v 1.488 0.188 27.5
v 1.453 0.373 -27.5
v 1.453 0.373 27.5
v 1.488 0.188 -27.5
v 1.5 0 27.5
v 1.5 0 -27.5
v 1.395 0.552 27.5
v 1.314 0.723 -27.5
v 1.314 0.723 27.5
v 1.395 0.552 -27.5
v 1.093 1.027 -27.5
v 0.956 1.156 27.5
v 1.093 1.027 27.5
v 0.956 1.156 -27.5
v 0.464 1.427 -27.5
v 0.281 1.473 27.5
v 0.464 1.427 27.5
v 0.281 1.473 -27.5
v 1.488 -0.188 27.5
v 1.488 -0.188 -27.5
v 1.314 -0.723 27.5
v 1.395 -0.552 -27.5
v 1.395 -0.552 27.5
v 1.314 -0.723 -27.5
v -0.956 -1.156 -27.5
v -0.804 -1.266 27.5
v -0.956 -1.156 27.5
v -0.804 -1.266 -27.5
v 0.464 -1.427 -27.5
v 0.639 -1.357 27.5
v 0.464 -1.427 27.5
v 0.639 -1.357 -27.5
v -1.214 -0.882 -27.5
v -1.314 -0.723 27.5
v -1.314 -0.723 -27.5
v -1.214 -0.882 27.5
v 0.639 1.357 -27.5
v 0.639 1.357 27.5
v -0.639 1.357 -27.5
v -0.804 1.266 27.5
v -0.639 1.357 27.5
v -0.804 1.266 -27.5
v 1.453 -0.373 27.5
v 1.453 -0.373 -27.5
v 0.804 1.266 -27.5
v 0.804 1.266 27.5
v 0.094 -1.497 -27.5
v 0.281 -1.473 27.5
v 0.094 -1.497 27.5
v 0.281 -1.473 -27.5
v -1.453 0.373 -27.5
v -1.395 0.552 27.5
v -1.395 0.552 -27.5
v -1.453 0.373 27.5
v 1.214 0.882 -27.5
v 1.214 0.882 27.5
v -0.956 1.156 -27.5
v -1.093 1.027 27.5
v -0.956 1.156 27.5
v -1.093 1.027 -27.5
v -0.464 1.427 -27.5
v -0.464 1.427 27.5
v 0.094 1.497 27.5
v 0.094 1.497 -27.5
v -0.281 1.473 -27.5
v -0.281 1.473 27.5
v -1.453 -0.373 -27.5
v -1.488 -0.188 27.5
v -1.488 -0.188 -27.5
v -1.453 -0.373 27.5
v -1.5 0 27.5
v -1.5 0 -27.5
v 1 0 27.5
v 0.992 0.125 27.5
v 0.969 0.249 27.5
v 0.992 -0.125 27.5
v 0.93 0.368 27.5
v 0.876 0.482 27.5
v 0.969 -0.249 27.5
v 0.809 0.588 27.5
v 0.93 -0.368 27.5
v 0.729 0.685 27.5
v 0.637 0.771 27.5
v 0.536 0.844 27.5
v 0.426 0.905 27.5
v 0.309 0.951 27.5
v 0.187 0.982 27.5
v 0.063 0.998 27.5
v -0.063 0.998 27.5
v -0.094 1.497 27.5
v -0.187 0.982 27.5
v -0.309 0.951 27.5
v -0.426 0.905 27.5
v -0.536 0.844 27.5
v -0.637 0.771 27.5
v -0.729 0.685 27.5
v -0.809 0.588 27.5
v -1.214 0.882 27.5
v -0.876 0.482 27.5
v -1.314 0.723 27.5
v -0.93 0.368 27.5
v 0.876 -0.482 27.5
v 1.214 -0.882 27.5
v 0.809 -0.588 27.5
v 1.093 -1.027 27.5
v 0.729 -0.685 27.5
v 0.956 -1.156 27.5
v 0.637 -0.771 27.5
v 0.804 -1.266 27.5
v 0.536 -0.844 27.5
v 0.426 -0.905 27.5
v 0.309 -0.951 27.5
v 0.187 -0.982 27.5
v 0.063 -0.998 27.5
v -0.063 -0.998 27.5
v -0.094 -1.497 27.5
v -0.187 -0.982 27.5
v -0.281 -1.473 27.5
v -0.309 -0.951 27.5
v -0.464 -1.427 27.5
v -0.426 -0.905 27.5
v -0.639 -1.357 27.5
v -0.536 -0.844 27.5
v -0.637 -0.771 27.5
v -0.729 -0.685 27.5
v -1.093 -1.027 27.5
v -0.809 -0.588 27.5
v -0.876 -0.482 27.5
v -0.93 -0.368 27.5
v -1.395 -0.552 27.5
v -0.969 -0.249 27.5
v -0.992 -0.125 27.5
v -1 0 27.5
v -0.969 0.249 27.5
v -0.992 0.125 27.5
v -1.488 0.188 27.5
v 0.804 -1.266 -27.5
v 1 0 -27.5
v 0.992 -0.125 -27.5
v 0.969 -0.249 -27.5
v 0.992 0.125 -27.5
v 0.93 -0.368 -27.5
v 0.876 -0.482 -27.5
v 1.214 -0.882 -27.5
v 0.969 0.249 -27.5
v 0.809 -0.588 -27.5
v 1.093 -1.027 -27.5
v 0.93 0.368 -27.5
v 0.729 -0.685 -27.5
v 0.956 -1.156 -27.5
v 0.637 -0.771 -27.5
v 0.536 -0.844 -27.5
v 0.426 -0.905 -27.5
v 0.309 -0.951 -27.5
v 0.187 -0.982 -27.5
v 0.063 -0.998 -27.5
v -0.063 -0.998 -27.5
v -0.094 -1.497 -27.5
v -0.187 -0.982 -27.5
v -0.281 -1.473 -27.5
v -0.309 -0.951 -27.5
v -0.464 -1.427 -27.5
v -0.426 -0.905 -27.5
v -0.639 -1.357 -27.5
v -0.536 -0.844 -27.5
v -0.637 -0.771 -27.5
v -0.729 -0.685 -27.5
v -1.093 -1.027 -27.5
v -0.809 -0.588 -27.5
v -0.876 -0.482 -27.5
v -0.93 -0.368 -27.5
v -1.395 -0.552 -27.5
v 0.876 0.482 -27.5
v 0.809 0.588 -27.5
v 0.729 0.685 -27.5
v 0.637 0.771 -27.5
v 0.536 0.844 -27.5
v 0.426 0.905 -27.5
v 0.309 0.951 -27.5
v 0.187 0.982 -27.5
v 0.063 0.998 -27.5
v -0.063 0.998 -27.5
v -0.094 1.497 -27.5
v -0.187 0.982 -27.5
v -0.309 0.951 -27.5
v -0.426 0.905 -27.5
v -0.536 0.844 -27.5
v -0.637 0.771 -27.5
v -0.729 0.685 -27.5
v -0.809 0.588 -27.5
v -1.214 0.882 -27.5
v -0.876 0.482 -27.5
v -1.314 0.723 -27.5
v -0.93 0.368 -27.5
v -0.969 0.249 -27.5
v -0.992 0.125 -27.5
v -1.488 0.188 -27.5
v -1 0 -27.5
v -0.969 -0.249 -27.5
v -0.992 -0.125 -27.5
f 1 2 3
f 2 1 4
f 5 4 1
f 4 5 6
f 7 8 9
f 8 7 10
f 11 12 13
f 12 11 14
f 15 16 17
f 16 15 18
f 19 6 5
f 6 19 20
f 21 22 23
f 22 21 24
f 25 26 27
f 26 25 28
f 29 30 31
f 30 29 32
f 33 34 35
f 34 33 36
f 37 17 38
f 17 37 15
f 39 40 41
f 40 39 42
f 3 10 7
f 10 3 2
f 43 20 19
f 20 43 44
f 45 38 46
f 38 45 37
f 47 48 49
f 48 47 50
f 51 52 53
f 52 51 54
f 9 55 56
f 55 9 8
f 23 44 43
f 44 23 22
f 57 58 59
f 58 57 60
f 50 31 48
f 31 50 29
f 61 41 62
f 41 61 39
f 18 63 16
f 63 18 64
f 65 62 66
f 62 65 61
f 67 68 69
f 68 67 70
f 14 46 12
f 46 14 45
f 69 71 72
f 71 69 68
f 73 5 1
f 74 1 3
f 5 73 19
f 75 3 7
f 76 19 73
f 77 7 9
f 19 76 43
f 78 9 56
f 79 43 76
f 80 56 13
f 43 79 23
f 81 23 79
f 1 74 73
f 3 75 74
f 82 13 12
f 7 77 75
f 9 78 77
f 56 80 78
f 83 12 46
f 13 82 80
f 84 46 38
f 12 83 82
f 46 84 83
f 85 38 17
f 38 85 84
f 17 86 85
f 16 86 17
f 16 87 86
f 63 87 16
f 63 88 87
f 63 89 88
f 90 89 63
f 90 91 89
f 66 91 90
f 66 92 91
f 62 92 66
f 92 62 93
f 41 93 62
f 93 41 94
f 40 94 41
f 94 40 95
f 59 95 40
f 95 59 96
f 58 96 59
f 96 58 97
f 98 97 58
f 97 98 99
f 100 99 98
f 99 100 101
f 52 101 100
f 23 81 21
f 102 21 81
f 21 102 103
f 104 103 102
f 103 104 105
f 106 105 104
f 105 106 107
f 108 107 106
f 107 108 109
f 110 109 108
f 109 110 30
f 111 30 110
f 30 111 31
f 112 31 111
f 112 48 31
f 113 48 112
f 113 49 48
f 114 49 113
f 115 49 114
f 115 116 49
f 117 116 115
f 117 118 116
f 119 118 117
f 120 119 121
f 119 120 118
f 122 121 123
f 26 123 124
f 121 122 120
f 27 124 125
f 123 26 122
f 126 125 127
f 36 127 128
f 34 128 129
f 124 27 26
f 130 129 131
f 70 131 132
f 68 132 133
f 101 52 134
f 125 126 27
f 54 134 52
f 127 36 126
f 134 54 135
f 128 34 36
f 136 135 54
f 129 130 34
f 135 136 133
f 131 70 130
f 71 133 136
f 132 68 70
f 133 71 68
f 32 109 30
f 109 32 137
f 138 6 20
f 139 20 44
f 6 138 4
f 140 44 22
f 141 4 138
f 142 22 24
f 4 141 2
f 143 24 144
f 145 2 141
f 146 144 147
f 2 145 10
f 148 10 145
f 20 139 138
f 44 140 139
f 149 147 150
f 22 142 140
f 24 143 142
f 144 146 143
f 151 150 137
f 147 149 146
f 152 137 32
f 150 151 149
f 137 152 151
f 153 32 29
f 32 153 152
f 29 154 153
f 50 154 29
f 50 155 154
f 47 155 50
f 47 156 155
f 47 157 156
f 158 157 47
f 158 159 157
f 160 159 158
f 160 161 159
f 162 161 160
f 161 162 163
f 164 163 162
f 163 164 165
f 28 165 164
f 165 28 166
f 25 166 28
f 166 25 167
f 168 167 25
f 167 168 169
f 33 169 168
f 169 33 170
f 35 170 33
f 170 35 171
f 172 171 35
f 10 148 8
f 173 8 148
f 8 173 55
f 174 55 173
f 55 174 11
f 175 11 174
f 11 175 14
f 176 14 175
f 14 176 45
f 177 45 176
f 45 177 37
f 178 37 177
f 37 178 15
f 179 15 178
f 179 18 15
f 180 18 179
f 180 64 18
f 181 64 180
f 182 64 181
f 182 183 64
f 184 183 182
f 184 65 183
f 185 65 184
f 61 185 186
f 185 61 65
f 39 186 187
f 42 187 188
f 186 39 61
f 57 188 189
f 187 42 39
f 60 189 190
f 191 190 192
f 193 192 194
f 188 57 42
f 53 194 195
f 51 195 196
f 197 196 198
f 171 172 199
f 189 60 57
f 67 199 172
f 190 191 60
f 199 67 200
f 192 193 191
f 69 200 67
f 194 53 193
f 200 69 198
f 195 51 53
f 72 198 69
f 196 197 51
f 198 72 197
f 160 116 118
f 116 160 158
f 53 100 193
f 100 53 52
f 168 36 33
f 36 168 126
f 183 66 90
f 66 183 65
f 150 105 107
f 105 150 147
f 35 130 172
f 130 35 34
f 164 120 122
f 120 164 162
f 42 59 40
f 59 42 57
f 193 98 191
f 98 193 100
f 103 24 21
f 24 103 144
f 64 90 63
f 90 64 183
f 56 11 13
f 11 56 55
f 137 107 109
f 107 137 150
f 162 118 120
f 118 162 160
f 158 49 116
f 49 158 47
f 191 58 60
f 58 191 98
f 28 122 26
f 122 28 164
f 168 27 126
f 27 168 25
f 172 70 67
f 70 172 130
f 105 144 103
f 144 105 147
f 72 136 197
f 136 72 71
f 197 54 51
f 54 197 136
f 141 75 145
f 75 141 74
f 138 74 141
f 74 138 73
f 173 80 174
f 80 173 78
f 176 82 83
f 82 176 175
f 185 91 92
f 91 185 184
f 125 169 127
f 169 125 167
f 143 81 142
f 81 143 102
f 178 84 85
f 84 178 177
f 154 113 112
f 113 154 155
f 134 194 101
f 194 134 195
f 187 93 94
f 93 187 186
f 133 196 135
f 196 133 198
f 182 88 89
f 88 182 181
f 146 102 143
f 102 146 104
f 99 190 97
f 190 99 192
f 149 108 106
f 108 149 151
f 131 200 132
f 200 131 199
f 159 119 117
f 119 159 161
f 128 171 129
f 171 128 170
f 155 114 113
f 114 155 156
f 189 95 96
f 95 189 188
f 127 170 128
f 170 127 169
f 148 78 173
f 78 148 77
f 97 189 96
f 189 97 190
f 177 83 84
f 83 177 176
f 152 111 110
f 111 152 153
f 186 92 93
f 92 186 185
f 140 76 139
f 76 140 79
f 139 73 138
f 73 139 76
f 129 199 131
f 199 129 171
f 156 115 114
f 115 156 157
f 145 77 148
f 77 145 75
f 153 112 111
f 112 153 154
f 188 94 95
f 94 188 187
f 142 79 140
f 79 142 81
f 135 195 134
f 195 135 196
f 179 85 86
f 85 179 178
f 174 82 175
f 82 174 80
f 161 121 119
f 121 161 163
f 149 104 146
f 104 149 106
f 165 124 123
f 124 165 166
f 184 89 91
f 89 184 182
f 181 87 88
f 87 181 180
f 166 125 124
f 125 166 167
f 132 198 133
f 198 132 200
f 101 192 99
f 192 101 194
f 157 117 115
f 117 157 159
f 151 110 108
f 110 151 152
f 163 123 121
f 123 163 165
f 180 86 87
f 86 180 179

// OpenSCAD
$fn = 50;


difference() {
	union() {
		translate(v = [0, 0, -27.5000000000]) {
			cylinder(h = 55, r = 1.5000000000);
		}
	}
	union() {
		translate(v = [0, 0, -100.0000000000]) {
			cylinder(h = 200, r = 1.0000000000);
		}
	}
}
